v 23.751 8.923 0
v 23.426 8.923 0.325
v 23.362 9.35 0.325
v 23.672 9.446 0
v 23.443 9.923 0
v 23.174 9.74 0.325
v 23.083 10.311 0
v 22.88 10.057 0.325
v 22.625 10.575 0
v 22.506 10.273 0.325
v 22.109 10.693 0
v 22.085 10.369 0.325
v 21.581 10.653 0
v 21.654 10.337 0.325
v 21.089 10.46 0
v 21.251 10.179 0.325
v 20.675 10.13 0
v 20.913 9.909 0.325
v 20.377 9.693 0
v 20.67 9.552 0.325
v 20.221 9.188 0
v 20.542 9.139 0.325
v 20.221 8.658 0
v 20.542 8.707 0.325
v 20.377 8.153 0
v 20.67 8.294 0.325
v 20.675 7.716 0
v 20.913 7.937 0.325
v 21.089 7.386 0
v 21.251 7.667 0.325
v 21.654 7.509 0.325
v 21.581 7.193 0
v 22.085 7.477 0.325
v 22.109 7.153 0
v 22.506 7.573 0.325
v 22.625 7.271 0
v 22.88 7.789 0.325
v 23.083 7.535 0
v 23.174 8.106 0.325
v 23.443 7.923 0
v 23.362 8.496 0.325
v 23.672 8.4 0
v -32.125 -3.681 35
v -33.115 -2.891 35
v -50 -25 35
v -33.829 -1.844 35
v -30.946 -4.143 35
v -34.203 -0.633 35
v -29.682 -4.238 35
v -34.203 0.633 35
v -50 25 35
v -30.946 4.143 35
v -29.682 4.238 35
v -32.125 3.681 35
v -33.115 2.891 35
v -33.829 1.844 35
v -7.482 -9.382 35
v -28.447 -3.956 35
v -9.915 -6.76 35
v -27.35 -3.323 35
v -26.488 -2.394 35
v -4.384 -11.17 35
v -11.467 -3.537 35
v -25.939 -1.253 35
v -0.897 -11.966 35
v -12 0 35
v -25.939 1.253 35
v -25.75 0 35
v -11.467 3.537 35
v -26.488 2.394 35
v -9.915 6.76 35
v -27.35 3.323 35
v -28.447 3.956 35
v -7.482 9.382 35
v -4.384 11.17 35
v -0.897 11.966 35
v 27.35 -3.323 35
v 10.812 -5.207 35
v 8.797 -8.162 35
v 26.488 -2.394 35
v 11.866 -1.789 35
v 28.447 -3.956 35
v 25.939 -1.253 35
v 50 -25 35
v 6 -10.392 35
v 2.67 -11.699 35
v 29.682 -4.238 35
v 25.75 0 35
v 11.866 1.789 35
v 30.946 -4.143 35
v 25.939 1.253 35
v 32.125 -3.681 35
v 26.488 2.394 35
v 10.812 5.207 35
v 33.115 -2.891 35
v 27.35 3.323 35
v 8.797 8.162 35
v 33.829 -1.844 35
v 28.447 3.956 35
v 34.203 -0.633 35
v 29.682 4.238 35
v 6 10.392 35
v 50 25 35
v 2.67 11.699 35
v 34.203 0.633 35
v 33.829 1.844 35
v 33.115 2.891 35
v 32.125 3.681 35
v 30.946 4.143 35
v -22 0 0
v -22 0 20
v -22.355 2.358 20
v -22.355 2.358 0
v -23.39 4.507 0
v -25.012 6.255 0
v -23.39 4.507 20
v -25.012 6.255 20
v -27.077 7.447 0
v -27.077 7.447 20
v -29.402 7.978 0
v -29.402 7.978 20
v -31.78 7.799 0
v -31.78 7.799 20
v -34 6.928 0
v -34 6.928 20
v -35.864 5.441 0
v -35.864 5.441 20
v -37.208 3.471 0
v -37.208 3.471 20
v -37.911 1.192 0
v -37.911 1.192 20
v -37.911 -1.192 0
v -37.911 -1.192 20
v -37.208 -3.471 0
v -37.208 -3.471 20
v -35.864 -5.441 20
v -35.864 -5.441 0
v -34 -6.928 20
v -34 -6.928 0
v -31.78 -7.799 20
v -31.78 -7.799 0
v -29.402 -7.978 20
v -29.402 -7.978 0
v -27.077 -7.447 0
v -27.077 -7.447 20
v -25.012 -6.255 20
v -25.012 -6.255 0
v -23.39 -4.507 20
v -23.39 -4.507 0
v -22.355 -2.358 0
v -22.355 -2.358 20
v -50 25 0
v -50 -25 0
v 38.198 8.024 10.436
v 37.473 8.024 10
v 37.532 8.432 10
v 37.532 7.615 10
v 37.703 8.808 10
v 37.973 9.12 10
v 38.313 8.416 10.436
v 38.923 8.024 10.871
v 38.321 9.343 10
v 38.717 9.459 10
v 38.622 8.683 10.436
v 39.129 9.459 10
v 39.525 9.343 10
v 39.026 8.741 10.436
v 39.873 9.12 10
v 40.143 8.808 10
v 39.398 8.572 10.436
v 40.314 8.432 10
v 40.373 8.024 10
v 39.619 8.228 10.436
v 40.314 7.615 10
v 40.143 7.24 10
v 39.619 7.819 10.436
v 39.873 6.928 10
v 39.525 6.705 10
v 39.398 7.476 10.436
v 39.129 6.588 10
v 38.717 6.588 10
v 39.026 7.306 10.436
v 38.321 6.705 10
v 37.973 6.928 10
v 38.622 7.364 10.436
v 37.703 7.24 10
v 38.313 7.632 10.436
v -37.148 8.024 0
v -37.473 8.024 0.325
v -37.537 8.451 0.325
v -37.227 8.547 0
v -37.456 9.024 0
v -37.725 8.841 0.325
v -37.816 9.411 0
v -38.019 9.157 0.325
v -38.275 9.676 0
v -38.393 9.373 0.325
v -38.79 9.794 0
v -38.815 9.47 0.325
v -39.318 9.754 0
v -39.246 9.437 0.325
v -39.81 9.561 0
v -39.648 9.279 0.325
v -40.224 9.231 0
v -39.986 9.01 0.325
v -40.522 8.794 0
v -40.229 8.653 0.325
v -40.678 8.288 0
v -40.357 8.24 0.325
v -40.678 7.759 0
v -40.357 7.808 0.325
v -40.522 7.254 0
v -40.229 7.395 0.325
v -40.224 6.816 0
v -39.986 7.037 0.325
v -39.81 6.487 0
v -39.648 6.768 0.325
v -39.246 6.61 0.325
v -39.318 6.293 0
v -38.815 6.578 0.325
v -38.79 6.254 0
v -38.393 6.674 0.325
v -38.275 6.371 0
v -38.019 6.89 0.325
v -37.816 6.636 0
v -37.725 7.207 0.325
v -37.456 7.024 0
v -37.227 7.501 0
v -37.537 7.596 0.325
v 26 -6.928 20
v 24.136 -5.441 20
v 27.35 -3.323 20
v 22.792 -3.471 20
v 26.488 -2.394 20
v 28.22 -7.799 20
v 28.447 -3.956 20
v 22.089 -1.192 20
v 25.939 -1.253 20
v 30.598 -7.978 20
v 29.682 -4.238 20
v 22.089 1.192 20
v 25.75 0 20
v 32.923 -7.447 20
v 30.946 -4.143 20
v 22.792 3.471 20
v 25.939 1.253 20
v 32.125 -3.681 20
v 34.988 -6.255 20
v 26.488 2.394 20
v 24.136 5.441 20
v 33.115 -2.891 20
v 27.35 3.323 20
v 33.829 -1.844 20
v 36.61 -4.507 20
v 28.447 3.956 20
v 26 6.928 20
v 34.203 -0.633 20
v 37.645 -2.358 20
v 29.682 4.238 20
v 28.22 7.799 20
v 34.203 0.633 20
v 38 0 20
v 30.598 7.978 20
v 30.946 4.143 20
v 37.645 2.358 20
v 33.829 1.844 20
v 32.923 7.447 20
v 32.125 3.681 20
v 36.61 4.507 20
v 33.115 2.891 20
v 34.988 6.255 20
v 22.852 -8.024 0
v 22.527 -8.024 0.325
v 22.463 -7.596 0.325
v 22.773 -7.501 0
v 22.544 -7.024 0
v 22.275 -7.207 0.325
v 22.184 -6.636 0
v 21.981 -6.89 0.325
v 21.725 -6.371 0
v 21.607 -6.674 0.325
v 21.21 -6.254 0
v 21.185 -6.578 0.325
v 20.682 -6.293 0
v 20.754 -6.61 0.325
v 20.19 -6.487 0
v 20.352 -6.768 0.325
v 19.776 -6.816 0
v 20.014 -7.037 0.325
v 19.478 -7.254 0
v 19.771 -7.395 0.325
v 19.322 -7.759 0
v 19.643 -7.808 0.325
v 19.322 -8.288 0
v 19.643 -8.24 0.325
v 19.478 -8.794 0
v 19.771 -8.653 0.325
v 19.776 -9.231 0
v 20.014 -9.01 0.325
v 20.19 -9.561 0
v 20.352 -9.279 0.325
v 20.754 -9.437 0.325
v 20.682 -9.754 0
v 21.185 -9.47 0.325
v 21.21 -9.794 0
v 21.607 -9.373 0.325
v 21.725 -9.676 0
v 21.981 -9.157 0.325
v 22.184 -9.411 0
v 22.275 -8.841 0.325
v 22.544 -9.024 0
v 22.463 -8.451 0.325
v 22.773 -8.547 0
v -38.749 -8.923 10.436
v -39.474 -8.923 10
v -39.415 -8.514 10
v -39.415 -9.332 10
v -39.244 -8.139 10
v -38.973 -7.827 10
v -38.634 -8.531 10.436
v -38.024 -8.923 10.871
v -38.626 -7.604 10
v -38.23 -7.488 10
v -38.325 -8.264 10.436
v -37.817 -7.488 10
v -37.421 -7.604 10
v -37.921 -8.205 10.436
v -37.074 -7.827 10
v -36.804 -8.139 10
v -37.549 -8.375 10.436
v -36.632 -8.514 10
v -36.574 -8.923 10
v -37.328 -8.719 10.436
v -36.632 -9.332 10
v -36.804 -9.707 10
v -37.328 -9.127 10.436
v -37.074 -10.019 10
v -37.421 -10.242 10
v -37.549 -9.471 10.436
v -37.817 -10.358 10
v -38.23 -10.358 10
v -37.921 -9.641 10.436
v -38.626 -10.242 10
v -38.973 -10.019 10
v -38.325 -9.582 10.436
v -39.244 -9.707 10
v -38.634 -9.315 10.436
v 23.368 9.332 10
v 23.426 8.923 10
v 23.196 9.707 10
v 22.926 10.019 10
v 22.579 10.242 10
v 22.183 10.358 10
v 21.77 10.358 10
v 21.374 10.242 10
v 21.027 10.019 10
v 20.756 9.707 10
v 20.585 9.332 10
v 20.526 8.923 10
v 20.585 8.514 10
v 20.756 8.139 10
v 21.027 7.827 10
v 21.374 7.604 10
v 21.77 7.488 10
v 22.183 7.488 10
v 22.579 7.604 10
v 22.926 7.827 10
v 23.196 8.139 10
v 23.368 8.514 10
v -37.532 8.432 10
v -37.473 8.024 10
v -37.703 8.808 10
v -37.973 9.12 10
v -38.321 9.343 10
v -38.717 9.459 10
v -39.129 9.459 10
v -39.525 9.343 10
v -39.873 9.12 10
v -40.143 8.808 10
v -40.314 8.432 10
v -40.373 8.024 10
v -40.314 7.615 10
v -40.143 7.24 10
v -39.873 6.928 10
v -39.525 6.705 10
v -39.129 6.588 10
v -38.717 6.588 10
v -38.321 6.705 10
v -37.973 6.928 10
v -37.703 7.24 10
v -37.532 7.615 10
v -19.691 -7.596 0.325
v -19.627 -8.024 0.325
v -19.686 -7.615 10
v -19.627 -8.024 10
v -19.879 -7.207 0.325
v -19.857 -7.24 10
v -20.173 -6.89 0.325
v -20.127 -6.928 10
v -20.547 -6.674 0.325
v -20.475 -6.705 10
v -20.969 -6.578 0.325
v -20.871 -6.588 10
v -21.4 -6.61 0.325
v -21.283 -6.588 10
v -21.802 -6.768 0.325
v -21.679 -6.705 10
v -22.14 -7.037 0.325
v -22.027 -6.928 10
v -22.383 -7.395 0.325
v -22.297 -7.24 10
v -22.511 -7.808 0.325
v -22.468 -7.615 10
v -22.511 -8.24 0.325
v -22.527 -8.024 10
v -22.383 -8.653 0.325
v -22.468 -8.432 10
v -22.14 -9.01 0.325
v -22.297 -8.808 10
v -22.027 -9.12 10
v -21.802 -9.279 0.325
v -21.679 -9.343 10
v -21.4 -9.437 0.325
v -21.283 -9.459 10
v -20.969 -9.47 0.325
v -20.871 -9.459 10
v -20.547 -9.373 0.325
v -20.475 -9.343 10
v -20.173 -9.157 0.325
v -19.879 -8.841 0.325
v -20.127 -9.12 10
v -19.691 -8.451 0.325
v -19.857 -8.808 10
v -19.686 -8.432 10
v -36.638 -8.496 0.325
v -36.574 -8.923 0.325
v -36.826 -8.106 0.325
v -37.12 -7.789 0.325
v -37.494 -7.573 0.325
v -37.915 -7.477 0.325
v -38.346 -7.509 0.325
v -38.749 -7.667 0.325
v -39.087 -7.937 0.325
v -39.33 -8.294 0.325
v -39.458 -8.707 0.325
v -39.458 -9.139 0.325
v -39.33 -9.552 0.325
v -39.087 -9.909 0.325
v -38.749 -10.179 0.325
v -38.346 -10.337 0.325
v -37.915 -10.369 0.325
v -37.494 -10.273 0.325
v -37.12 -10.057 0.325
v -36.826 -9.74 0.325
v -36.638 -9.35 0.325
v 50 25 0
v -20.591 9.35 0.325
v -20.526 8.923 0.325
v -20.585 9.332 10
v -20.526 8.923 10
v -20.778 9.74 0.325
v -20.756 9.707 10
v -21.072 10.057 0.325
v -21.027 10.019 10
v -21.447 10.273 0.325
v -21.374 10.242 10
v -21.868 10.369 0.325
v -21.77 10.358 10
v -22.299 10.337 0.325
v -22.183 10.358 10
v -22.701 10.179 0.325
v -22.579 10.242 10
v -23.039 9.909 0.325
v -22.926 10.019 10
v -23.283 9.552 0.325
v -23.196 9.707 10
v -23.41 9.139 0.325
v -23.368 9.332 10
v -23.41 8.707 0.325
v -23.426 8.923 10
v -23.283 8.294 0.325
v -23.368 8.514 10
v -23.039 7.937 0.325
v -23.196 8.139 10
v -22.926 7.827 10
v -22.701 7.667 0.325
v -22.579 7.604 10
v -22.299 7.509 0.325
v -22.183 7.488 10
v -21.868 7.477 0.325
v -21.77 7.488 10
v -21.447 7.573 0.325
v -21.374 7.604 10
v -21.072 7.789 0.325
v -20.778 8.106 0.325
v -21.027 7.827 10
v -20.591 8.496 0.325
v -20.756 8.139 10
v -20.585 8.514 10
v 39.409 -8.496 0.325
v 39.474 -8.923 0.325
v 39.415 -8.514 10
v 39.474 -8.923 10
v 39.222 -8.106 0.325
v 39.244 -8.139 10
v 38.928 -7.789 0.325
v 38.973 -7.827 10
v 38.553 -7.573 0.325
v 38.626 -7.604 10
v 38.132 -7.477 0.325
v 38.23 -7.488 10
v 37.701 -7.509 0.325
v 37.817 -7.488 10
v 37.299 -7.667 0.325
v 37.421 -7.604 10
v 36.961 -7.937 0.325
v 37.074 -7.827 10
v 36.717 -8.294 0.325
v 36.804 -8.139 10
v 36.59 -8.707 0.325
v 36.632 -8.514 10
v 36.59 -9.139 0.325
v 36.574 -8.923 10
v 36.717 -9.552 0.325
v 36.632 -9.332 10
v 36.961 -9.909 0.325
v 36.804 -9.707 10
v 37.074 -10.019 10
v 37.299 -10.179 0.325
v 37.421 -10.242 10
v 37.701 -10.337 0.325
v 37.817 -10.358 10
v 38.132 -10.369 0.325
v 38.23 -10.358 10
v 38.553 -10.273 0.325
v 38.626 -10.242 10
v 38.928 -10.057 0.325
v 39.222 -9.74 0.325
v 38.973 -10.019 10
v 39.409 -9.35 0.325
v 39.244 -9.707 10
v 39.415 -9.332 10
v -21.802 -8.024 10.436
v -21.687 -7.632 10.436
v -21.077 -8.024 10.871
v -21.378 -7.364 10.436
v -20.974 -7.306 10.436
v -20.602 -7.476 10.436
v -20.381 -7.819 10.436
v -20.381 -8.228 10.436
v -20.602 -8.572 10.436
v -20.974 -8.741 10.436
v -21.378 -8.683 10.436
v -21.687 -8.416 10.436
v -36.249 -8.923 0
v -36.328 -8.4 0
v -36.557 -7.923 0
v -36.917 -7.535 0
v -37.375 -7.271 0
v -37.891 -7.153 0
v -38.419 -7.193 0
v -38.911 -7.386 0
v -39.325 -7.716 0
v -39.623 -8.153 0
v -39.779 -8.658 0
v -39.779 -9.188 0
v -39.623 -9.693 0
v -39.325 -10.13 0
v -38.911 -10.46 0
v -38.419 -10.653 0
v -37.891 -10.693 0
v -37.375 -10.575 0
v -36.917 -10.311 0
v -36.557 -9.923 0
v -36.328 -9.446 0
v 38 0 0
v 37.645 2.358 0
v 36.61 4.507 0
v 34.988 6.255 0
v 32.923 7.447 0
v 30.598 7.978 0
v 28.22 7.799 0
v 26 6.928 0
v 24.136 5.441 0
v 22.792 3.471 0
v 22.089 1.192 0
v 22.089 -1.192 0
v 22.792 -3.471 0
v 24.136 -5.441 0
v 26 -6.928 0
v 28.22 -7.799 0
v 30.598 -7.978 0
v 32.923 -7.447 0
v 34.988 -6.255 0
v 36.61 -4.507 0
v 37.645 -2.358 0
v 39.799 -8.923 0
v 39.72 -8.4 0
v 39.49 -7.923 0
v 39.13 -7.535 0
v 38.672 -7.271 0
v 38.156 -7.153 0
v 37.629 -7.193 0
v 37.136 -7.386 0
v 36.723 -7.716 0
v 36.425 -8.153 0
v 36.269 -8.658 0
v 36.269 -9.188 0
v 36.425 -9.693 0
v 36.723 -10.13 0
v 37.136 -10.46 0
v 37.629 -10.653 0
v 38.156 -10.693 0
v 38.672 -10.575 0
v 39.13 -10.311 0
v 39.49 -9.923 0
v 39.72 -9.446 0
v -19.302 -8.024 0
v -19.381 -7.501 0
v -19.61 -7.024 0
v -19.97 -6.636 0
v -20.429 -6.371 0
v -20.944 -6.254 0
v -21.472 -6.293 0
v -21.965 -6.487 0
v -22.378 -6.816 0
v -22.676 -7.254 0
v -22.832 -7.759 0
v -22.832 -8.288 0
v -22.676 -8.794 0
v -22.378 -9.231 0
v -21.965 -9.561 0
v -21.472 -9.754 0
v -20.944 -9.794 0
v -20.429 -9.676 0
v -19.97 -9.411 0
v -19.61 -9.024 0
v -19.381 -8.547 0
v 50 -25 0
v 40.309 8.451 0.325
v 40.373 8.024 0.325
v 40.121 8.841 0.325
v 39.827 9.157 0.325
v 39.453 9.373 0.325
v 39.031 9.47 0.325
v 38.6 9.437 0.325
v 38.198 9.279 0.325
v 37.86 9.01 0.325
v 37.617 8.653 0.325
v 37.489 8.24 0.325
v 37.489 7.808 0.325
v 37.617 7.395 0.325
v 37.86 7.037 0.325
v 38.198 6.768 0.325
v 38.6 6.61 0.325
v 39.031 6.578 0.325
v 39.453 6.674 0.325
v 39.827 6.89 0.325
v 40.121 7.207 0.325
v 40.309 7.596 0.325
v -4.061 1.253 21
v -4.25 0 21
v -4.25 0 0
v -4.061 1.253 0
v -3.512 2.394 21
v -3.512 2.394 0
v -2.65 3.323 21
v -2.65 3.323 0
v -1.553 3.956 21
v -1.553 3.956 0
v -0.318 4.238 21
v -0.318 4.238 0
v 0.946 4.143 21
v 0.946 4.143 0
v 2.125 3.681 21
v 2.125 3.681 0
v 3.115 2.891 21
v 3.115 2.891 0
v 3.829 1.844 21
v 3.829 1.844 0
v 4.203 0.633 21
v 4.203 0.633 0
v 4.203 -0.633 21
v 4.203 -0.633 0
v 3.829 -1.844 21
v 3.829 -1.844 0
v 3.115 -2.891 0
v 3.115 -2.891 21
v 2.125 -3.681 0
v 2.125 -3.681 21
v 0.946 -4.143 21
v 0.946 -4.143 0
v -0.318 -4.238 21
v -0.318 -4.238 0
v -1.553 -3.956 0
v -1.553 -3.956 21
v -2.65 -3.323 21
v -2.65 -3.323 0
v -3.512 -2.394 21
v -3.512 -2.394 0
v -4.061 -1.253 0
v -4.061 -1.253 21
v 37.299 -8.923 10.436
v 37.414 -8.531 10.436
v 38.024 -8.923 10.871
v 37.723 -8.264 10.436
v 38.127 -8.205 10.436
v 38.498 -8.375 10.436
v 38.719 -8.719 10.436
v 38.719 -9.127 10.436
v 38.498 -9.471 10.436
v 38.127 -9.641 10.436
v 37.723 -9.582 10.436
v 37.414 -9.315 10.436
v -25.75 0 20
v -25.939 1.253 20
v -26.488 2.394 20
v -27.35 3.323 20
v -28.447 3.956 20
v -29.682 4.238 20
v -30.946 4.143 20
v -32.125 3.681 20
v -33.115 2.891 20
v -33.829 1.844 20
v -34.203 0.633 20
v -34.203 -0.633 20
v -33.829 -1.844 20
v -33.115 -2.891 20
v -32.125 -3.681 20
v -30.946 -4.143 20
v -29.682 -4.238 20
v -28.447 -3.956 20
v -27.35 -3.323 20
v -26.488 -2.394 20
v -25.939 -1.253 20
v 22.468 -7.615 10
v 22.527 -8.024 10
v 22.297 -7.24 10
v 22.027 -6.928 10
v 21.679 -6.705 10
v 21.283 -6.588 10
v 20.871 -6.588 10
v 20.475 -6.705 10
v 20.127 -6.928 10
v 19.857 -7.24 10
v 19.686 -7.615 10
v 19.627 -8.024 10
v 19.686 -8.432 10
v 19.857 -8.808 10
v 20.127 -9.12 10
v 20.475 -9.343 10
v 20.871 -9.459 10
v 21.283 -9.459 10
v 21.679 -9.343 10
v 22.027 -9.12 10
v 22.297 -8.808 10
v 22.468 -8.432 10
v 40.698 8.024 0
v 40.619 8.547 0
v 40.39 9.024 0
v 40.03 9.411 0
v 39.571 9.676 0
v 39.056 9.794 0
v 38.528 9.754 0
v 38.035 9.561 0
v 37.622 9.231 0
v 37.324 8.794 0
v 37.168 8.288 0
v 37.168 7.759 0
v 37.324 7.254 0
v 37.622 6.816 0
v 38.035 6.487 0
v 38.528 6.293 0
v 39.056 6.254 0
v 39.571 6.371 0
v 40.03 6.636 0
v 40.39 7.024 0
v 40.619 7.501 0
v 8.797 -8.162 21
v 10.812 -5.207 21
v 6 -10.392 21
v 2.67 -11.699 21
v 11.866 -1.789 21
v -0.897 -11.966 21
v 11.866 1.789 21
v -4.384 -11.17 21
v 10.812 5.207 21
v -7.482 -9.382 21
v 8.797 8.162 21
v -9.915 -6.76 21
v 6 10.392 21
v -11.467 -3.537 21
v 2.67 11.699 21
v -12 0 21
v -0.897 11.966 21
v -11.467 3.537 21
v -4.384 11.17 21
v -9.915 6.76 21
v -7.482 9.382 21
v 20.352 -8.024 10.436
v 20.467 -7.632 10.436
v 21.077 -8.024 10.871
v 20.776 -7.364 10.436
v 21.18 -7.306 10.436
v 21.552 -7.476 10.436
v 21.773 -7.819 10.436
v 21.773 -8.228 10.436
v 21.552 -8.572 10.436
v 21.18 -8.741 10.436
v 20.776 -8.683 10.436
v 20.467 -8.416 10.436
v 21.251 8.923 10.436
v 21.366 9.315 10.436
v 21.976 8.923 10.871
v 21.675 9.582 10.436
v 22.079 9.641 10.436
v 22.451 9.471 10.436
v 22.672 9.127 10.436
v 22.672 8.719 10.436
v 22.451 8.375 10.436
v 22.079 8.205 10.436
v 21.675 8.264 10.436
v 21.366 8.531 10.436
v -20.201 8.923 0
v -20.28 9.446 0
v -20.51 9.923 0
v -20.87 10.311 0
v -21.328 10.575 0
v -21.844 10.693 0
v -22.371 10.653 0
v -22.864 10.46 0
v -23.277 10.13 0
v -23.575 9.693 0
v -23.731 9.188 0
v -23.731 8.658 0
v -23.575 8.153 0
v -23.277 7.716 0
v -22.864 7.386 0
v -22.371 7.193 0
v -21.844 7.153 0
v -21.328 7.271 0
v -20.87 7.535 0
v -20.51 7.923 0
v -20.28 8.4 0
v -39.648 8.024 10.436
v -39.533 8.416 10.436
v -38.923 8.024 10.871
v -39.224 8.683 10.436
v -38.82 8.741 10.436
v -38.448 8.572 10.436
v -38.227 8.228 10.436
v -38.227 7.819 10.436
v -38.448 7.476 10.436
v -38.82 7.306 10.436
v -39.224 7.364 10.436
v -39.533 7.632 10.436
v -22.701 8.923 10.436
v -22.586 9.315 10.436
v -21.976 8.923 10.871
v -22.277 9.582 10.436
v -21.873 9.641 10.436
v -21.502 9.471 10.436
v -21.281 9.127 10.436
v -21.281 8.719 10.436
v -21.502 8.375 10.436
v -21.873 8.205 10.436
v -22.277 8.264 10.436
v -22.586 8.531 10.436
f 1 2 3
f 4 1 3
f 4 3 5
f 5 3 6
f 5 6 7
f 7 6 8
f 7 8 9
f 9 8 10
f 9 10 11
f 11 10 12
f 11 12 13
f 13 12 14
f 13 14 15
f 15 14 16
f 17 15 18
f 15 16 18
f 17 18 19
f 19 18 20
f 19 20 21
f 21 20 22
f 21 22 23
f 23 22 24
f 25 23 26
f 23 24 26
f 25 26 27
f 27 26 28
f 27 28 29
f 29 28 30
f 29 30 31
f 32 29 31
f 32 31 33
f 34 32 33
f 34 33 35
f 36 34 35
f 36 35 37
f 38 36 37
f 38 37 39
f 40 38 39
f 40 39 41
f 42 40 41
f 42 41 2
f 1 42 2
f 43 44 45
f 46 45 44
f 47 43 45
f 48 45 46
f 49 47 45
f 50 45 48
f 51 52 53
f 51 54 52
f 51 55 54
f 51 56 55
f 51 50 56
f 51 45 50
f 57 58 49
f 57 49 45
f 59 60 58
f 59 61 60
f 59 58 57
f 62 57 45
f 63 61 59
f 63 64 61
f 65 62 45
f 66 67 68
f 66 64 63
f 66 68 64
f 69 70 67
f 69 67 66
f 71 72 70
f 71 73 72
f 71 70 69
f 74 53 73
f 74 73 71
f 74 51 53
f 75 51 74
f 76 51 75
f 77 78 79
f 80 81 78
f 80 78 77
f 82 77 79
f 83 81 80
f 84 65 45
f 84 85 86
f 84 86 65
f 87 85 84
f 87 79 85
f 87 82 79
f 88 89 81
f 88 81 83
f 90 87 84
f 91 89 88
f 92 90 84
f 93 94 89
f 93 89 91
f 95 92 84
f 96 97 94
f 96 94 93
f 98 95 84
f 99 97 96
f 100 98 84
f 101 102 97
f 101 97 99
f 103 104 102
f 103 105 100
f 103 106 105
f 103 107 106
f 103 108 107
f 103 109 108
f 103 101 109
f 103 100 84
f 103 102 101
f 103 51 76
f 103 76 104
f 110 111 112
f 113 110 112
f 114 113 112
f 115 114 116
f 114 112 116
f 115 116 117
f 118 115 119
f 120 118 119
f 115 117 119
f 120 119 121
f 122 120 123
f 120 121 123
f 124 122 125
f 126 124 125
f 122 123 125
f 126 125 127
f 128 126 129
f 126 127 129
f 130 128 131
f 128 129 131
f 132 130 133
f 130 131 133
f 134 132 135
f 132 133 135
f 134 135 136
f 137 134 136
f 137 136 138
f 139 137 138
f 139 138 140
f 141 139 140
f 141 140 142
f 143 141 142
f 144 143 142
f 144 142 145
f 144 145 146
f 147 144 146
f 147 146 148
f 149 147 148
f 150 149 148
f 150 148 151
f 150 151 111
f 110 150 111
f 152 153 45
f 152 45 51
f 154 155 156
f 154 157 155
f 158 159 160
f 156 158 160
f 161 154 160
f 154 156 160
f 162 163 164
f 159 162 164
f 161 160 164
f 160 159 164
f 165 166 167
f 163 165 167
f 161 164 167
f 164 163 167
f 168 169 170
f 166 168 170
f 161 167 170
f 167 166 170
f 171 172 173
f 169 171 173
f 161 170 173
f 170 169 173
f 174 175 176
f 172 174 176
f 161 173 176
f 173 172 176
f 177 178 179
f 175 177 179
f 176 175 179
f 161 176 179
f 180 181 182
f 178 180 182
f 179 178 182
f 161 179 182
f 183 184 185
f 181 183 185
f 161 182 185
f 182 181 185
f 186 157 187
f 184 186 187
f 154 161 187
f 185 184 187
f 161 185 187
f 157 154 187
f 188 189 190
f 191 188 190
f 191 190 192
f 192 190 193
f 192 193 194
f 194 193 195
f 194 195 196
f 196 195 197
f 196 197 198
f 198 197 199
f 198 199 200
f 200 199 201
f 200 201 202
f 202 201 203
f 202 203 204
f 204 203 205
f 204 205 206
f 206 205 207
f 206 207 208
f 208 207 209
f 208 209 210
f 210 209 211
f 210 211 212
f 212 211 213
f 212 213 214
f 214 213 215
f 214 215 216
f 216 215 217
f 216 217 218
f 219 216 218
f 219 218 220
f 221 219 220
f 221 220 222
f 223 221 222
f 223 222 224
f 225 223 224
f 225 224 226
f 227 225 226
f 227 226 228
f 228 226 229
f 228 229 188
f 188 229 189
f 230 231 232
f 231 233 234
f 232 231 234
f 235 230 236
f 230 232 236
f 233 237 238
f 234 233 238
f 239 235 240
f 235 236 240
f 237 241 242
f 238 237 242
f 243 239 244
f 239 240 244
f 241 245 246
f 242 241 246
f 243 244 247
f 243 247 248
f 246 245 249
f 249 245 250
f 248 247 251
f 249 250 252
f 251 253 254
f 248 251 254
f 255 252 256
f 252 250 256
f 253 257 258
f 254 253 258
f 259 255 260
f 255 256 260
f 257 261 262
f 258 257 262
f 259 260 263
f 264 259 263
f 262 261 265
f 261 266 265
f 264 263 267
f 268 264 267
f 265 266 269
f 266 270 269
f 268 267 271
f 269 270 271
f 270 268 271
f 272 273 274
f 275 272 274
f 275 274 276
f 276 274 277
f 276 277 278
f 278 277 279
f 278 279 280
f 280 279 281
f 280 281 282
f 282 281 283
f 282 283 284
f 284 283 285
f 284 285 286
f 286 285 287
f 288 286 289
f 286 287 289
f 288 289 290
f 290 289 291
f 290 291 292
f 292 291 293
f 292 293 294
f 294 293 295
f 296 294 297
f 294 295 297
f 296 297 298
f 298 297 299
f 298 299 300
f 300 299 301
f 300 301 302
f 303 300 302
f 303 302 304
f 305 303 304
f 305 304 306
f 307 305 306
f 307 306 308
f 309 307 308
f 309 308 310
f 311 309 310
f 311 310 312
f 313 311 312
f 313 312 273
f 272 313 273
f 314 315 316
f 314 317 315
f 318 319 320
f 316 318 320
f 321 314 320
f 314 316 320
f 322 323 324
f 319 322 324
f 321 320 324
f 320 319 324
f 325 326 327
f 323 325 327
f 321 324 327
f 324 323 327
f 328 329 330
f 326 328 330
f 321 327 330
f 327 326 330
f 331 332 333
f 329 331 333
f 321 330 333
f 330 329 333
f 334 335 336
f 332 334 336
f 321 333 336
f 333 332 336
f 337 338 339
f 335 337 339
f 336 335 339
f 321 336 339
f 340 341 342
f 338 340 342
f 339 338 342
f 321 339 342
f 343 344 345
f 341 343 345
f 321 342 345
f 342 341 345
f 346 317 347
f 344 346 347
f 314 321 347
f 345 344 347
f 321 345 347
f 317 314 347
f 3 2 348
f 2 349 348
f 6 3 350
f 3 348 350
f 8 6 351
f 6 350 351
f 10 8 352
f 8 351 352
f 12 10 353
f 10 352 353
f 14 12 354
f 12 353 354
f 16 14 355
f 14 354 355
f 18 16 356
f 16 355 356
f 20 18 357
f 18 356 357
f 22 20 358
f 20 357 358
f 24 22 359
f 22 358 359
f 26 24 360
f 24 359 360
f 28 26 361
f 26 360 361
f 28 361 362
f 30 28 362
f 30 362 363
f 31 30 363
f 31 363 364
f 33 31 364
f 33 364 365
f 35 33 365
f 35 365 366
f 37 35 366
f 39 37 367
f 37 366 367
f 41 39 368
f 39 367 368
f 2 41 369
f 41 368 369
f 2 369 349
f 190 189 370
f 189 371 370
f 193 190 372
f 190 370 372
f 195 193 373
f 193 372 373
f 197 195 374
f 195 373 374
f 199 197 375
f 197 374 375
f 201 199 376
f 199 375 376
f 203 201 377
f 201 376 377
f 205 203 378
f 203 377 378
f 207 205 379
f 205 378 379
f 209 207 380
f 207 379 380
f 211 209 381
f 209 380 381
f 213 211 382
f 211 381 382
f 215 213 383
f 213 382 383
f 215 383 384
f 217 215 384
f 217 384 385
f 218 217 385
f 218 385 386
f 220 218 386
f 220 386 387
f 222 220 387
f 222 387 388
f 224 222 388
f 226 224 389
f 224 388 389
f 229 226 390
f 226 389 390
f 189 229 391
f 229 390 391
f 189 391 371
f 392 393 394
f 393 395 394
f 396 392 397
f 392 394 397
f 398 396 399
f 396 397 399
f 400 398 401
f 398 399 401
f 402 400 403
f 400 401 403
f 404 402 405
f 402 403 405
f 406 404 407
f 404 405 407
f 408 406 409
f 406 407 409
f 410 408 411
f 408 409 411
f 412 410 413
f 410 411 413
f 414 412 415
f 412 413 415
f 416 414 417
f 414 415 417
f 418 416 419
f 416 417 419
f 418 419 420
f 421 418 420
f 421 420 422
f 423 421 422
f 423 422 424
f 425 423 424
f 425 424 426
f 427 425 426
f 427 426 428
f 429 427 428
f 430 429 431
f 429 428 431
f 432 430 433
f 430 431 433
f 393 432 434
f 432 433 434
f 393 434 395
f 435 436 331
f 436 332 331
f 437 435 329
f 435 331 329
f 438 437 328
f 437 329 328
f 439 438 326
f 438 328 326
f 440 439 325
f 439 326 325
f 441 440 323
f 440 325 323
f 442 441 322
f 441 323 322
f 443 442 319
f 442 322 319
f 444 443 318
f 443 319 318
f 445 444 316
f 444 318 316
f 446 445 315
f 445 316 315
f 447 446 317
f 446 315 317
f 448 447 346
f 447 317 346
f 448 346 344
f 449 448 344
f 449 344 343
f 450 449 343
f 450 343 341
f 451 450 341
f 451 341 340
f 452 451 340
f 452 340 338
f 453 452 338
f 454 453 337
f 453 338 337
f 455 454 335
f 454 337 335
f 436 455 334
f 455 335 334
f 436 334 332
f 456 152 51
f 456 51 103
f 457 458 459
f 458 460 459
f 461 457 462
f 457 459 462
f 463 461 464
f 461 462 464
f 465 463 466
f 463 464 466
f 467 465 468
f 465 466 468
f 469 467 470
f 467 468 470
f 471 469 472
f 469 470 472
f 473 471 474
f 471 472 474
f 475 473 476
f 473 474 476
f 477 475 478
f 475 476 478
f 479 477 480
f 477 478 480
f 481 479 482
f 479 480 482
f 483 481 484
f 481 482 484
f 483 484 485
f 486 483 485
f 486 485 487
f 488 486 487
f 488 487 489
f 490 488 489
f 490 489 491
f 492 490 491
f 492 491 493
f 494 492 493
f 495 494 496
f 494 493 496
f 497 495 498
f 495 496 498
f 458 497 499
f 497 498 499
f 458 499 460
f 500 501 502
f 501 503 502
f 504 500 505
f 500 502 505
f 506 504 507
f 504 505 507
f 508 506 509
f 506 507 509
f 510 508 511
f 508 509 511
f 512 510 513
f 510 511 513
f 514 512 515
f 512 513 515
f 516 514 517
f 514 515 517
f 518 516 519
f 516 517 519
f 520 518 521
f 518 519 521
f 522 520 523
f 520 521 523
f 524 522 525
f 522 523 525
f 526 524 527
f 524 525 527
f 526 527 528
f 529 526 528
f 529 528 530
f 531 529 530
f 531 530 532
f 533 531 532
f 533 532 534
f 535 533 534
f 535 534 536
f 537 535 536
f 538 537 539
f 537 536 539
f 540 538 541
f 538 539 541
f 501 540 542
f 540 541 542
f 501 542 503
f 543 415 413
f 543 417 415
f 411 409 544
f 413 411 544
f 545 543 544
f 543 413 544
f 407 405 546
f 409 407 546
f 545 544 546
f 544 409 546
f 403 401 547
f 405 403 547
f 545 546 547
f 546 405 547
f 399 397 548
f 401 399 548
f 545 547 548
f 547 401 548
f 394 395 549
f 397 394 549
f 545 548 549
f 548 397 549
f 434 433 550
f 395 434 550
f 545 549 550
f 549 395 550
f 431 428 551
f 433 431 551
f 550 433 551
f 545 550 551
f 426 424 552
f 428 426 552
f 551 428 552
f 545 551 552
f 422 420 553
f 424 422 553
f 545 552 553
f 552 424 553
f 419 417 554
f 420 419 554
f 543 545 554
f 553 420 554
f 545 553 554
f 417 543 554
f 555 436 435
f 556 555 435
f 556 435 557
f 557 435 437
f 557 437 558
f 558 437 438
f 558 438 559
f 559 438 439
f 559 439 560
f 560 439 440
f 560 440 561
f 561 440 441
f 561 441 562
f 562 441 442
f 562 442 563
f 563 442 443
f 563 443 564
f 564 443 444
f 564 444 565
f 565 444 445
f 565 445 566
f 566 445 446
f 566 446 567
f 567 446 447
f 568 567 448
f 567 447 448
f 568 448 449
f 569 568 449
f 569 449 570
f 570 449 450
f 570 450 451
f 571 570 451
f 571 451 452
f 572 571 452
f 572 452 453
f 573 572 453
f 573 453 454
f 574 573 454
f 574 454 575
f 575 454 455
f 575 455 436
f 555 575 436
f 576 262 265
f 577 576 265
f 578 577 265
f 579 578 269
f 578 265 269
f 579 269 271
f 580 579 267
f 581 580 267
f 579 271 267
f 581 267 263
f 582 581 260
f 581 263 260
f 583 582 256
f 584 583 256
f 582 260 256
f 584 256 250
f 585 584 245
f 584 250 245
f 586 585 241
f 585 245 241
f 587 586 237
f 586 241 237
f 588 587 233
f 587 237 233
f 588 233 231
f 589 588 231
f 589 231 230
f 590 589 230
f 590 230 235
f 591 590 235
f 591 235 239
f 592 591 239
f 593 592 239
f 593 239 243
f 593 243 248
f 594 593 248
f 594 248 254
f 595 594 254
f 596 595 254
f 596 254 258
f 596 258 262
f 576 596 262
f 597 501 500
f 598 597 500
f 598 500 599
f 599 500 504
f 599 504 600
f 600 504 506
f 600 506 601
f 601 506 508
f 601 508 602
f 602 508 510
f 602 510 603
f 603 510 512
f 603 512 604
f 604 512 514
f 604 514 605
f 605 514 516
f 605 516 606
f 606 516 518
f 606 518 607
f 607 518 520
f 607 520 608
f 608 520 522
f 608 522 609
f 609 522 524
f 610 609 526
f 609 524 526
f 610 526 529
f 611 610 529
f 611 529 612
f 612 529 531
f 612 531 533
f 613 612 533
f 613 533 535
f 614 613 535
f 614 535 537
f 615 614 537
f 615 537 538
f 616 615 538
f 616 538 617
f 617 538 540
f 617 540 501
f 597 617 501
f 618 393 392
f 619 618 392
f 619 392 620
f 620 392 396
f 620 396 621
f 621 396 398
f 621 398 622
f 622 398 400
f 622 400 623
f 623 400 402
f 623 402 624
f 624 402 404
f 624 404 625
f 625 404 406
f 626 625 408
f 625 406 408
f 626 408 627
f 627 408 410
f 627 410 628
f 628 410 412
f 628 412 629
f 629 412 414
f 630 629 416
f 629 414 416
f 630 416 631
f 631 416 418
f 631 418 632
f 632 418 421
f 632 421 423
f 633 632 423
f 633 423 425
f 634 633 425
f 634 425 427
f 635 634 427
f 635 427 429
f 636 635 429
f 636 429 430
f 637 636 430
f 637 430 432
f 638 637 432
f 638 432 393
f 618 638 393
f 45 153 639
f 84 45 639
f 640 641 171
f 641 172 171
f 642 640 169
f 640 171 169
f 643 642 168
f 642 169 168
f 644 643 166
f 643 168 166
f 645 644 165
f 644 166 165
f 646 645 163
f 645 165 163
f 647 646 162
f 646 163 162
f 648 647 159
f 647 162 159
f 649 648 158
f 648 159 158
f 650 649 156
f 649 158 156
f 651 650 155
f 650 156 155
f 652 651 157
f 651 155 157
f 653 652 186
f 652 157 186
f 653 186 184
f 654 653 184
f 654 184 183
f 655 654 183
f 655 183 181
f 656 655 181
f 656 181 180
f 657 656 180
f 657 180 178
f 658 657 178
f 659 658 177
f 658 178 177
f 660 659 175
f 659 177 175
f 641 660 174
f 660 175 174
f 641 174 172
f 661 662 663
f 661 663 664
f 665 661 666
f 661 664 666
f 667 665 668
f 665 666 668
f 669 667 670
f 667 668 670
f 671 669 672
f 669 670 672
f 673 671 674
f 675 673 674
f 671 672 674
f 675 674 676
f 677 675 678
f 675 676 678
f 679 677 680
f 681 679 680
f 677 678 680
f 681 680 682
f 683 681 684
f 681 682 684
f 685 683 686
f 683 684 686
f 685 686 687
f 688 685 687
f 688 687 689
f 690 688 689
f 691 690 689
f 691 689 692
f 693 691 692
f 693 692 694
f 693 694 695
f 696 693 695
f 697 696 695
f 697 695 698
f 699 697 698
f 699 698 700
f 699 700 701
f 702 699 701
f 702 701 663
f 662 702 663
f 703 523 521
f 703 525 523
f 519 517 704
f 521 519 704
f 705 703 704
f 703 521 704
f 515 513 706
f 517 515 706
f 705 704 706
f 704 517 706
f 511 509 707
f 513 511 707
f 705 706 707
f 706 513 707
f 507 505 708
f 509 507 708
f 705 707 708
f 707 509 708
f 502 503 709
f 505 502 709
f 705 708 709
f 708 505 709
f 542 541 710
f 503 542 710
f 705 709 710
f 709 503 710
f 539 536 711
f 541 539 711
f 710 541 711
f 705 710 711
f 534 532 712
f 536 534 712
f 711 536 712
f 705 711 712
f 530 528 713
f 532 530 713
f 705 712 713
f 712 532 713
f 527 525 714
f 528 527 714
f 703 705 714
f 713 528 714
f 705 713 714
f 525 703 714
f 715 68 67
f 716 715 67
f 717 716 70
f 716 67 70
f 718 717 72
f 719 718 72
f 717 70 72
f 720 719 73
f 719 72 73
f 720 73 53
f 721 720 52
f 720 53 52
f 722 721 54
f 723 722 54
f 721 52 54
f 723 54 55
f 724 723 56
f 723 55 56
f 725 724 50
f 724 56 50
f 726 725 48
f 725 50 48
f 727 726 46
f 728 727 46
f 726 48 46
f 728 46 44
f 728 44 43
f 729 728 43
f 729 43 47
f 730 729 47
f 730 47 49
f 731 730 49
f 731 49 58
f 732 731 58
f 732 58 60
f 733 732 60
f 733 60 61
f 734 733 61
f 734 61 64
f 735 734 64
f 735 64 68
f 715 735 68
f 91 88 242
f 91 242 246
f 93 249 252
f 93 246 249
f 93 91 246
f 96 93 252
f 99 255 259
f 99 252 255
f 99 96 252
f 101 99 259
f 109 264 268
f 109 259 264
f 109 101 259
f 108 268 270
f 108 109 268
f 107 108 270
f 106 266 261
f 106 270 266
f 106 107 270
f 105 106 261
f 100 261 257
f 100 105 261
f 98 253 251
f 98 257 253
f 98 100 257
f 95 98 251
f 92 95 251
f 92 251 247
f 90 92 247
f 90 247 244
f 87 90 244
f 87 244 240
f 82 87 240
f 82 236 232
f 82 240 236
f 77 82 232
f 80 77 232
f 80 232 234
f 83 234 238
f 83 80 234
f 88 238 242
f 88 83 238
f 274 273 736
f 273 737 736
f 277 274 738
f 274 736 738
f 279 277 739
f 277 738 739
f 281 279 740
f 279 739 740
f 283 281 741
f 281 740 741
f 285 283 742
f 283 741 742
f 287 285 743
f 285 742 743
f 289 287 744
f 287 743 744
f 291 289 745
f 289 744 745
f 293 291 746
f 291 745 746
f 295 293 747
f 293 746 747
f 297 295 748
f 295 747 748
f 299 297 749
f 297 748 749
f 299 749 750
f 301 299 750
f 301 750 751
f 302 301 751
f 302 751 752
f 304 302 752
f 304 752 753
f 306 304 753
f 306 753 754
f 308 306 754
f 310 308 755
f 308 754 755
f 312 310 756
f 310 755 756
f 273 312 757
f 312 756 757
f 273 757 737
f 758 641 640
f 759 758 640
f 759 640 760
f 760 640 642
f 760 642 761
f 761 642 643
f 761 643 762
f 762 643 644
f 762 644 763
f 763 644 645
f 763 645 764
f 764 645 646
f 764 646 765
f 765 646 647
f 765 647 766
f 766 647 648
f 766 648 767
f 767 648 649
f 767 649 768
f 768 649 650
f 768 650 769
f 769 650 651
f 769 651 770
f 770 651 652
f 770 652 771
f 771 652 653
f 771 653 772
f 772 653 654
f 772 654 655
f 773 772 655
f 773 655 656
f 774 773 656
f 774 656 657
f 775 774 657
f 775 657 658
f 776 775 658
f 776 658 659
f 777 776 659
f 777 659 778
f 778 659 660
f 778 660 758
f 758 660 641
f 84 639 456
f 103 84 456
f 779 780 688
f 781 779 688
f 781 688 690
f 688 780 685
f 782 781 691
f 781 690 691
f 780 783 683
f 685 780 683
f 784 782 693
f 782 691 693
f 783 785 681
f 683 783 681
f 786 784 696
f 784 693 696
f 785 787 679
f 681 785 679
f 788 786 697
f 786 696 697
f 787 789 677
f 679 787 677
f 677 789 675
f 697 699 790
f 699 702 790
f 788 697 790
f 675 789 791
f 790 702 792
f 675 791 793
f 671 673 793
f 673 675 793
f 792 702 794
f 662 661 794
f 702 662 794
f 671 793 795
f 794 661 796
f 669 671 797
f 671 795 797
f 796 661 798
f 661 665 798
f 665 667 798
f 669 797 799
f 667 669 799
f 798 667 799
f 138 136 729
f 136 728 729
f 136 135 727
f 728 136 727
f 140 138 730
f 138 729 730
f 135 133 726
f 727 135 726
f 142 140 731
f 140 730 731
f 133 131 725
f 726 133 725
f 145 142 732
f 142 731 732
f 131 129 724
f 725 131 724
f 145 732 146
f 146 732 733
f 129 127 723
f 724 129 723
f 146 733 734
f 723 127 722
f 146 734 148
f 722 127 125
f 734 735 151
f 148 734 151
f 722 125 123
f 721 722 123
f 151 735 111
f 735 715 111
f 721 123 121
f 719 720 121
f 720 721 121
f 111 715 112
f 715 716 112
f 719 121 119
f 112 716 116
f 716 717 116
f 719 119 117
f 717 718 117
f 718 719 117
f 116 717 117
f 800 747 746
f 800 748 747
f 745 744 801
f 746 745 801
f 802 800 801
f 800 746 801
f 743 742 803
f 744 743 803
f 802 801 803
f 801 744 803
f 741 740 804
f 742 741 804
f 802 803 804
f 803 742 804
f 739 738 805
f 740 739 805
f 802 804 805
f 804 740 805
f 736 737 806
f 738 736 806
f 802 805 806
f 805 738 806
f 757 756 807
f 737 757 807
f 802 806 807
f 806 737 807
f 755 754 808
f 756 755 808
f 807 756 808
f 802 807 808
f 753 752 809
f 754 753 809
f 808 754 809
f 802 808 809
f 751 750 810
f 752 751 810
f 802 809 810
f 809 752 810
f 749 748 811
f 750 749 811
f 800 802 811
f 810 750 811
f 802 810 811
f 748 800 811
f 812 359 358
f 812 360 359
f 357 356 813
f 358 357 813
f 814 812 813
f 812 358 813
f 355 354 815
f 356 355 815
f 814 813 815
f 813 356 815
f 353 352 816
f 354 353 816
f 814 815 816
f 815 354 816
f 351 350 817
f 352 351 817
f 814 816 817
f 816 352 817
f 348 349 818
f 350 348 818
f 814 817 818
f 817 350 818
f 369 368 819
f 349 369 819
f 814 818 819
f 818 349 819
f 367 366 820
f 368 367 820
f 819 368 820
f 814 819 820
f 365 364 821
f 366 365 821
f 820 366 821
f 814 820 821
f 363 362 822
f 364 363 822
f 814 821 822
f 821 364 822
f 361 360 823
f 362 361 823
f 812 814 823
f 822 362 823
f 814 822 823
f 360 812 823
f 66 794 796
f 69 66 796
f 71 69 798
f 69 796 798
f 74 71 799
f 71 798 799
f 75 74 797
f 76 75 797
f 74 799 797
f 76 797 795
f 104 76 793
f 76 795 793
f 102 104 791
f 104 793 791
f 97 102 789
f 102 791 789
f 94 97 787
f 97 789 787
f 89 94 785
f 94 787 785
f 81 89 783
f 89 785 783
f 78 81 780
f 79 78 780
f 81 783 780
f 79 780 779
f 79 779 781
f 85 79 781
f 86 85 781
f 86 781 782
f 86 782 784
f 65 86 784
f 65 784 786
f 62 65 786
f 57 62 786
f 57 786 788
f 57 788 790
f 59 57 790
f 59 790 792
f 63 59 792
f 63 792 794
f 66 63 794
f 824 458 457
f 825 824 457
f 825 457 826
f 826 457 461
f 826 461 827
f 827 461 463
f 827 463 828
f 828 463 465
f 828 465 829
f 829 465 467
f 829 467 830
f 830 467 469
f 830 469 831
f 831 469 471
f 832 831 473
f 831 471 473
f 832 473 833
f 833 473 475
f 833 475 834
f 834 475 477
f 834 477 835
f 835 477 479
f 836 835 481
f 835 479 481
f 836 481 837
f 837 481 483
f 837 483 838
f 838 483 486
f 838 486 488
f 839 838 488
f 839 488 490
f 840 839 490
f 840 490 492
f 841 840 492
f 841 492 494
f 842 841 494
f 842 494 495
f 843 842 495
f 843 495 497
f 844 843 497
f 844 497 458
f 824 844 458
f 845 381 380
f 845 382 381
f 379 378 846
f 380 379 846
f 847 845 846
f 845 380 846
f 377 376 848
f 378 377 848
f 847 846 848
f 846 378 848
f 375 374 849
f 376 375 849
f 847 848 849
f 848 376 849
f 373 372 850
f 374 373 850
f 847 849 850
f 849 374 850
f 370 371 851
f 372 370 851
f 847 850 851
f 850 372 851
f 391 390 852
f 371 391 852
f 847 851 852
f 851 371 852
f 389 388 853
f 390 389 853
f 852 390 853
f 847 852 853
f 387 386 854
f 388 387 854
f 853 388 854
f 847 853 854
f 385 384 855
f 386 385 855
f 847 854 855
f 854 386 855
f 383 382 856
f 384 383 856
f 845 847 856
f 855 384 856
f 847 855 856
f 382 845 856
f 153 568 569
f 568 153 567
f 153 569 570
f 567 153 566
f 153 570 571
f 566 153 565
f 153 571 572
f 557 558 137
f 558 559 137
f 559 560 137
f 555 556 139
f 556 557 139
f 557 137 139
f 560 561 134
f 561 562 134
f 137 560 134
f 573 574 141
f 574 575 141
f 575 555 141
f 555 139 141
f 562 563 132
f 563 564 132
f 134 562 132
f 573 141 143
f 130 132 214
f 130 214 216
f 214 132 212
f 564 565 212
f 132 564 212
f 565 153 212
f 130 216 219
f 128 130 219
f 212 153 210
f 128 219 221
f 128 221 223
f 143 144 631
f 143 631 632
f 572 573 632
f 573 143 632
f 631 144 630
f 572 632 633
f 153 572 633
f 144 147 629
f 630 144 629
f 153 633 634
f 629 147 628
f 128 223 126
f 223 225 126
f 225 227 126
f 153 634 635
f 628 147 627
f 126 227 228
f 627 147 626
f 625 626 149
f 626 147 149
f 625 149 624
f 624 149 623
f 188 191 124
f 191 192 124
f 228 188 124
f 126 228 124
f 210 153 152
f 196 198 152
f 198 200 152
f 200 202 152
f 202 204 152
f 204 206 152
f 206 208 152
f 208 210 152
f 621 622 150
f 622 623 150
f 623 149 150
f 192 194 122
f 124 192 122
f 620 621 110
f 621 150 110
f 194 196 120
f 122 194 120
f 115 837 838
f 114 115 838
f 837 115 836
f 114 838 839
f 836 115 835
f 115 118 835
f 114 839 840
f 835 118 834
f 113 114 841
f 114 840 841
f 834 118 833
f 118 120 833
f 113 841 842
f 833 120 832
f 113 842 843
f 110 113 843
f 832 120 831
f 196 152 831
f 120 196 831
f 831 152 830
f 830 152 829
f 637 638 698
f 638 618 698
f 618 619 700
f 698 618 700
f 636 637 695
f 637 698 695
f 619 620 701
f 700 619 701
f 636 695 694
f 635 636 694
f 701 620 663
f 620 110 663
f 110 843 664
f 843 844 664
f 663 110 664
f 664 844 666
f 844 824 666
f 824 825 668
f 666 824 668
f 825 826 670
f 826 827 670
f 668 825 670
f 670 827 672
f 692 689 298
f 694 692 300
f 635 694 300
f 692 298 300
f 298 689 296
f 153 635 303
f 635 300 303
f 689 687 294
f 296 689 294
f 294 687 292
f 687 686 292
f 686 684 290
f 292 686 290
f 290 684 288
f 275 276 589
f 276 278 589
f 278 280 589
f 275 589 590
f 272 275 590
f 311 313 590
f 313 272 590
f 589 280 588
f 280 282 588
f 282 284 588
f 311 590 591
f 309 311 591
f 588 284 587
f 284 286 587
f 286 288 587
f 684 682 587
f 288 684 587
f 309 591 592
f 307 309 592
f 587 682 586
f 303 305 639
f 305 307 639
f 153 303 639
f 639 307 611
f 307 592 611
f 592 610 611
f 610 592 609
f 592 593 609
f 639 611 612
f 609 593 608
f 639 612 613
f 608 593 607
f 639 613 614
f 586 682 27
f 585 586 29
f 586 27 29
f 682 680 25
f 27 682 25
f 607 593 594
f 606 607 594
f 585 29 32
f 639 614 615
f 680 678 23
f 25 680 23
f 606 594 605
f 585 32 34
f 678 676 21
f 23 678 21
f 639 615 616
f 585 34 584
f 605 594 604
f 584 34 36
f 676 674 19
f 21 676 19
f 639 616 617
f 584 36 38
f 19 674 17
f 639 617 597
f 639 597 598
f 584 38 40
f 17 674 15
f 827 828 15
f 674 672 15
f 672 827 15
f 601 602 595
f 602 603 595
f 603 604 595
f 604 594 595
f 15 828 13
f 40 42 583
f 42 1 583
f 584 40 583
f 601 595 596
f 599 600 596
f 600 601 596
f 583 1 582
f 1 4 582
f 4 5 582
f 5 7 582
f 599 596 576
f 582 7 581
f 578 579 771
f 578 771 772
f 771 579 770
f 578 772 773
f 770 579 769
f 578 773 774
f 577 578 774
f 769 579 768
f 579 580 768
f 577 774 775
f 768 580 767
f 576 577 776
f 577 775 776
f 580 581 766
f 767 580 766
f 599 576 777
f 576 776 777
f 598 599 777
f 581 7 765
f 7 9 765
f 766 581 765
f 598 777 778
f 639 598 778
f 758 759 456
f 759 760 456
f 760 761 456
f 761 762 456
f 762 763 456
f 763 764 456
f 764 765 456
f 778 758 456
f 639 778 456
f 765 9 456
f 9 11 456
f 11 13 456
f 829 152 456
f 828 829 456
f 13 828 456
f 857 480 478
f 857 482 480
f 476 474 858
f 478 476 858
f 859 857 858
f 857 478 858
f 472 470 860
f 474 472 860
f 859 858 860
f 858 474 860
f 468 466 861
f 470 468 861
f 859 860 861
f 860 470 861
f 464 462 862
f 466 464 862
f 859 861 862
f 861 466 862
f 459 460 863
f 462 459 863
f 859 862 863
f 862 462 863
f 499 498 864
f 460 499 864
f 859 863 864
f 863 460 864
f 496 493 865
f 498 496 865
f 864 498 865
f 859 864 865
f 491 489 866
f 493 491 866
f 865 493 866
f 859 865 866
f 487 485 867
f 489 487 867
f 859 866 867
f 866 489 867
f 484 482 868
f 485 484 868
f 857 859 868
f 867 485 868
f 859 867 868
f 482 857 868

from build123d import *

# Parameters (mm, degrees)
SKETCH_1_W                     = 100
SKETCH_1_H                     = 50
EXTRUDE_1_DEPTH                = 35
HOLE_WIZARD_8_5_8_5_1_D        = 8.5
HOLE_WIZARD_1_D                = 24
HOLE_WIZARD_1_DEPTH            = 14
HOLE_WIZARD_2_D                = 8.5
HOLE_WIZARD_3_D                = 16
HOLE_WIZARD_3_DEPTH            = 20
HOLE_WIZARD_M3_5_1_D           = 2.9
HOLE_WIZARD_M3_5_1_DEPTH       = 10
HOLE_WIZARD_M3_5_1_CSINK_D     = 3.55
HOLE_WIZARD_M3_5_1_CSINK_ANGLE = 90
HOLE_WIZARD_M3_5_1_TIP         = 0.871247898


with BuildPart() as part:
    # 草图1 → 凸台-拉伸1 (new body)
    with BuildSketch(Plane.XY):
        Rectangle(SKETCH_1_W, SKETCH_1_H)
    extrude(amount=EXTRUDE_1_DEPTH)

    # Ø8.5 (8.5) 直径孔1 (through all)
    with Locations(Plane.XY.offset(35)):
        with Locations((0, 0)):
            Hole(HOLE_WIZARD_8_5_8_5_1_D / 2)

    # 孔1
    with Locations(Plane.XY.offset(35)):
        with Locations((0, 0)):
            Hole(HOLE_WIZARD_1_D / 2, depth=HOLE_WIZARD_1_DEPTH)

    # 孔2 (through all)
    with Locations(Plane(origin=(0, 0, 0), x_dir=(-1, 0, 0), z_dir=(0, 0, -1))):
        with Locations((30, 0)):
            hole_wizard_2 = Hole(HOLE_WIZARD_2_D / 2)

    # 镜向1: 孔2 across plane
    add(hole_wizard_2.mirror(Plane.ZY), mode=Mode.SUBTRACT)

    # 孔3
    with Locations(Plane(origin=(0, 0, 0), x_dir=(-1, 0, 0), z_dir=(0, 0, -1))):
        with Locations((30, 0), (-30, 0)):
            Hole(HOLE_WIZARD_3_D / 2, depth=HOLE_WIZARD_3_DEPTH)

    # M3.5 螺纹孔1
    with Locations(Plane(origin=(0, 0, 0), x_dir=(-1, 0, 0), z_dir=(0, 0, -1))):
        with Locations((21.077002862, -8.023722457), (38.023722457, -8.922997138), (38.922997138, 8.023722457), (21.976277543, 8.922997138), (-21.077002862, -8.023722457), (-38.023722457, -8.922997138), (-38.922997138, 8.023722457), (-21.976277543, 8.922997138)):
            CounterSinkHole(HOLE_WIZARD_M3_5_1_D / 2, HOLE_WIZARD_M3_5_1_CSINK_D / 2, depth=HOLE_WIZARD_M3_5_1_DEPTH, counter_sink_angle=HOLE_WIZARD_M3_5_1_CSINK_ANGLE)
            with Locations((0, 0, -(HOLE_WIZARD_M3_5_1_DEPTH + HOLE_WIZARD_M3_5_1_TIP / 2))):  # 118° drill point
                Cone(0, HOLE_WIZARD_M3_5_1_D / 2, HOLE_WIZARD_M3_5_1_TIP, mode=Mode.SUBTRACT)


solid = part.part
